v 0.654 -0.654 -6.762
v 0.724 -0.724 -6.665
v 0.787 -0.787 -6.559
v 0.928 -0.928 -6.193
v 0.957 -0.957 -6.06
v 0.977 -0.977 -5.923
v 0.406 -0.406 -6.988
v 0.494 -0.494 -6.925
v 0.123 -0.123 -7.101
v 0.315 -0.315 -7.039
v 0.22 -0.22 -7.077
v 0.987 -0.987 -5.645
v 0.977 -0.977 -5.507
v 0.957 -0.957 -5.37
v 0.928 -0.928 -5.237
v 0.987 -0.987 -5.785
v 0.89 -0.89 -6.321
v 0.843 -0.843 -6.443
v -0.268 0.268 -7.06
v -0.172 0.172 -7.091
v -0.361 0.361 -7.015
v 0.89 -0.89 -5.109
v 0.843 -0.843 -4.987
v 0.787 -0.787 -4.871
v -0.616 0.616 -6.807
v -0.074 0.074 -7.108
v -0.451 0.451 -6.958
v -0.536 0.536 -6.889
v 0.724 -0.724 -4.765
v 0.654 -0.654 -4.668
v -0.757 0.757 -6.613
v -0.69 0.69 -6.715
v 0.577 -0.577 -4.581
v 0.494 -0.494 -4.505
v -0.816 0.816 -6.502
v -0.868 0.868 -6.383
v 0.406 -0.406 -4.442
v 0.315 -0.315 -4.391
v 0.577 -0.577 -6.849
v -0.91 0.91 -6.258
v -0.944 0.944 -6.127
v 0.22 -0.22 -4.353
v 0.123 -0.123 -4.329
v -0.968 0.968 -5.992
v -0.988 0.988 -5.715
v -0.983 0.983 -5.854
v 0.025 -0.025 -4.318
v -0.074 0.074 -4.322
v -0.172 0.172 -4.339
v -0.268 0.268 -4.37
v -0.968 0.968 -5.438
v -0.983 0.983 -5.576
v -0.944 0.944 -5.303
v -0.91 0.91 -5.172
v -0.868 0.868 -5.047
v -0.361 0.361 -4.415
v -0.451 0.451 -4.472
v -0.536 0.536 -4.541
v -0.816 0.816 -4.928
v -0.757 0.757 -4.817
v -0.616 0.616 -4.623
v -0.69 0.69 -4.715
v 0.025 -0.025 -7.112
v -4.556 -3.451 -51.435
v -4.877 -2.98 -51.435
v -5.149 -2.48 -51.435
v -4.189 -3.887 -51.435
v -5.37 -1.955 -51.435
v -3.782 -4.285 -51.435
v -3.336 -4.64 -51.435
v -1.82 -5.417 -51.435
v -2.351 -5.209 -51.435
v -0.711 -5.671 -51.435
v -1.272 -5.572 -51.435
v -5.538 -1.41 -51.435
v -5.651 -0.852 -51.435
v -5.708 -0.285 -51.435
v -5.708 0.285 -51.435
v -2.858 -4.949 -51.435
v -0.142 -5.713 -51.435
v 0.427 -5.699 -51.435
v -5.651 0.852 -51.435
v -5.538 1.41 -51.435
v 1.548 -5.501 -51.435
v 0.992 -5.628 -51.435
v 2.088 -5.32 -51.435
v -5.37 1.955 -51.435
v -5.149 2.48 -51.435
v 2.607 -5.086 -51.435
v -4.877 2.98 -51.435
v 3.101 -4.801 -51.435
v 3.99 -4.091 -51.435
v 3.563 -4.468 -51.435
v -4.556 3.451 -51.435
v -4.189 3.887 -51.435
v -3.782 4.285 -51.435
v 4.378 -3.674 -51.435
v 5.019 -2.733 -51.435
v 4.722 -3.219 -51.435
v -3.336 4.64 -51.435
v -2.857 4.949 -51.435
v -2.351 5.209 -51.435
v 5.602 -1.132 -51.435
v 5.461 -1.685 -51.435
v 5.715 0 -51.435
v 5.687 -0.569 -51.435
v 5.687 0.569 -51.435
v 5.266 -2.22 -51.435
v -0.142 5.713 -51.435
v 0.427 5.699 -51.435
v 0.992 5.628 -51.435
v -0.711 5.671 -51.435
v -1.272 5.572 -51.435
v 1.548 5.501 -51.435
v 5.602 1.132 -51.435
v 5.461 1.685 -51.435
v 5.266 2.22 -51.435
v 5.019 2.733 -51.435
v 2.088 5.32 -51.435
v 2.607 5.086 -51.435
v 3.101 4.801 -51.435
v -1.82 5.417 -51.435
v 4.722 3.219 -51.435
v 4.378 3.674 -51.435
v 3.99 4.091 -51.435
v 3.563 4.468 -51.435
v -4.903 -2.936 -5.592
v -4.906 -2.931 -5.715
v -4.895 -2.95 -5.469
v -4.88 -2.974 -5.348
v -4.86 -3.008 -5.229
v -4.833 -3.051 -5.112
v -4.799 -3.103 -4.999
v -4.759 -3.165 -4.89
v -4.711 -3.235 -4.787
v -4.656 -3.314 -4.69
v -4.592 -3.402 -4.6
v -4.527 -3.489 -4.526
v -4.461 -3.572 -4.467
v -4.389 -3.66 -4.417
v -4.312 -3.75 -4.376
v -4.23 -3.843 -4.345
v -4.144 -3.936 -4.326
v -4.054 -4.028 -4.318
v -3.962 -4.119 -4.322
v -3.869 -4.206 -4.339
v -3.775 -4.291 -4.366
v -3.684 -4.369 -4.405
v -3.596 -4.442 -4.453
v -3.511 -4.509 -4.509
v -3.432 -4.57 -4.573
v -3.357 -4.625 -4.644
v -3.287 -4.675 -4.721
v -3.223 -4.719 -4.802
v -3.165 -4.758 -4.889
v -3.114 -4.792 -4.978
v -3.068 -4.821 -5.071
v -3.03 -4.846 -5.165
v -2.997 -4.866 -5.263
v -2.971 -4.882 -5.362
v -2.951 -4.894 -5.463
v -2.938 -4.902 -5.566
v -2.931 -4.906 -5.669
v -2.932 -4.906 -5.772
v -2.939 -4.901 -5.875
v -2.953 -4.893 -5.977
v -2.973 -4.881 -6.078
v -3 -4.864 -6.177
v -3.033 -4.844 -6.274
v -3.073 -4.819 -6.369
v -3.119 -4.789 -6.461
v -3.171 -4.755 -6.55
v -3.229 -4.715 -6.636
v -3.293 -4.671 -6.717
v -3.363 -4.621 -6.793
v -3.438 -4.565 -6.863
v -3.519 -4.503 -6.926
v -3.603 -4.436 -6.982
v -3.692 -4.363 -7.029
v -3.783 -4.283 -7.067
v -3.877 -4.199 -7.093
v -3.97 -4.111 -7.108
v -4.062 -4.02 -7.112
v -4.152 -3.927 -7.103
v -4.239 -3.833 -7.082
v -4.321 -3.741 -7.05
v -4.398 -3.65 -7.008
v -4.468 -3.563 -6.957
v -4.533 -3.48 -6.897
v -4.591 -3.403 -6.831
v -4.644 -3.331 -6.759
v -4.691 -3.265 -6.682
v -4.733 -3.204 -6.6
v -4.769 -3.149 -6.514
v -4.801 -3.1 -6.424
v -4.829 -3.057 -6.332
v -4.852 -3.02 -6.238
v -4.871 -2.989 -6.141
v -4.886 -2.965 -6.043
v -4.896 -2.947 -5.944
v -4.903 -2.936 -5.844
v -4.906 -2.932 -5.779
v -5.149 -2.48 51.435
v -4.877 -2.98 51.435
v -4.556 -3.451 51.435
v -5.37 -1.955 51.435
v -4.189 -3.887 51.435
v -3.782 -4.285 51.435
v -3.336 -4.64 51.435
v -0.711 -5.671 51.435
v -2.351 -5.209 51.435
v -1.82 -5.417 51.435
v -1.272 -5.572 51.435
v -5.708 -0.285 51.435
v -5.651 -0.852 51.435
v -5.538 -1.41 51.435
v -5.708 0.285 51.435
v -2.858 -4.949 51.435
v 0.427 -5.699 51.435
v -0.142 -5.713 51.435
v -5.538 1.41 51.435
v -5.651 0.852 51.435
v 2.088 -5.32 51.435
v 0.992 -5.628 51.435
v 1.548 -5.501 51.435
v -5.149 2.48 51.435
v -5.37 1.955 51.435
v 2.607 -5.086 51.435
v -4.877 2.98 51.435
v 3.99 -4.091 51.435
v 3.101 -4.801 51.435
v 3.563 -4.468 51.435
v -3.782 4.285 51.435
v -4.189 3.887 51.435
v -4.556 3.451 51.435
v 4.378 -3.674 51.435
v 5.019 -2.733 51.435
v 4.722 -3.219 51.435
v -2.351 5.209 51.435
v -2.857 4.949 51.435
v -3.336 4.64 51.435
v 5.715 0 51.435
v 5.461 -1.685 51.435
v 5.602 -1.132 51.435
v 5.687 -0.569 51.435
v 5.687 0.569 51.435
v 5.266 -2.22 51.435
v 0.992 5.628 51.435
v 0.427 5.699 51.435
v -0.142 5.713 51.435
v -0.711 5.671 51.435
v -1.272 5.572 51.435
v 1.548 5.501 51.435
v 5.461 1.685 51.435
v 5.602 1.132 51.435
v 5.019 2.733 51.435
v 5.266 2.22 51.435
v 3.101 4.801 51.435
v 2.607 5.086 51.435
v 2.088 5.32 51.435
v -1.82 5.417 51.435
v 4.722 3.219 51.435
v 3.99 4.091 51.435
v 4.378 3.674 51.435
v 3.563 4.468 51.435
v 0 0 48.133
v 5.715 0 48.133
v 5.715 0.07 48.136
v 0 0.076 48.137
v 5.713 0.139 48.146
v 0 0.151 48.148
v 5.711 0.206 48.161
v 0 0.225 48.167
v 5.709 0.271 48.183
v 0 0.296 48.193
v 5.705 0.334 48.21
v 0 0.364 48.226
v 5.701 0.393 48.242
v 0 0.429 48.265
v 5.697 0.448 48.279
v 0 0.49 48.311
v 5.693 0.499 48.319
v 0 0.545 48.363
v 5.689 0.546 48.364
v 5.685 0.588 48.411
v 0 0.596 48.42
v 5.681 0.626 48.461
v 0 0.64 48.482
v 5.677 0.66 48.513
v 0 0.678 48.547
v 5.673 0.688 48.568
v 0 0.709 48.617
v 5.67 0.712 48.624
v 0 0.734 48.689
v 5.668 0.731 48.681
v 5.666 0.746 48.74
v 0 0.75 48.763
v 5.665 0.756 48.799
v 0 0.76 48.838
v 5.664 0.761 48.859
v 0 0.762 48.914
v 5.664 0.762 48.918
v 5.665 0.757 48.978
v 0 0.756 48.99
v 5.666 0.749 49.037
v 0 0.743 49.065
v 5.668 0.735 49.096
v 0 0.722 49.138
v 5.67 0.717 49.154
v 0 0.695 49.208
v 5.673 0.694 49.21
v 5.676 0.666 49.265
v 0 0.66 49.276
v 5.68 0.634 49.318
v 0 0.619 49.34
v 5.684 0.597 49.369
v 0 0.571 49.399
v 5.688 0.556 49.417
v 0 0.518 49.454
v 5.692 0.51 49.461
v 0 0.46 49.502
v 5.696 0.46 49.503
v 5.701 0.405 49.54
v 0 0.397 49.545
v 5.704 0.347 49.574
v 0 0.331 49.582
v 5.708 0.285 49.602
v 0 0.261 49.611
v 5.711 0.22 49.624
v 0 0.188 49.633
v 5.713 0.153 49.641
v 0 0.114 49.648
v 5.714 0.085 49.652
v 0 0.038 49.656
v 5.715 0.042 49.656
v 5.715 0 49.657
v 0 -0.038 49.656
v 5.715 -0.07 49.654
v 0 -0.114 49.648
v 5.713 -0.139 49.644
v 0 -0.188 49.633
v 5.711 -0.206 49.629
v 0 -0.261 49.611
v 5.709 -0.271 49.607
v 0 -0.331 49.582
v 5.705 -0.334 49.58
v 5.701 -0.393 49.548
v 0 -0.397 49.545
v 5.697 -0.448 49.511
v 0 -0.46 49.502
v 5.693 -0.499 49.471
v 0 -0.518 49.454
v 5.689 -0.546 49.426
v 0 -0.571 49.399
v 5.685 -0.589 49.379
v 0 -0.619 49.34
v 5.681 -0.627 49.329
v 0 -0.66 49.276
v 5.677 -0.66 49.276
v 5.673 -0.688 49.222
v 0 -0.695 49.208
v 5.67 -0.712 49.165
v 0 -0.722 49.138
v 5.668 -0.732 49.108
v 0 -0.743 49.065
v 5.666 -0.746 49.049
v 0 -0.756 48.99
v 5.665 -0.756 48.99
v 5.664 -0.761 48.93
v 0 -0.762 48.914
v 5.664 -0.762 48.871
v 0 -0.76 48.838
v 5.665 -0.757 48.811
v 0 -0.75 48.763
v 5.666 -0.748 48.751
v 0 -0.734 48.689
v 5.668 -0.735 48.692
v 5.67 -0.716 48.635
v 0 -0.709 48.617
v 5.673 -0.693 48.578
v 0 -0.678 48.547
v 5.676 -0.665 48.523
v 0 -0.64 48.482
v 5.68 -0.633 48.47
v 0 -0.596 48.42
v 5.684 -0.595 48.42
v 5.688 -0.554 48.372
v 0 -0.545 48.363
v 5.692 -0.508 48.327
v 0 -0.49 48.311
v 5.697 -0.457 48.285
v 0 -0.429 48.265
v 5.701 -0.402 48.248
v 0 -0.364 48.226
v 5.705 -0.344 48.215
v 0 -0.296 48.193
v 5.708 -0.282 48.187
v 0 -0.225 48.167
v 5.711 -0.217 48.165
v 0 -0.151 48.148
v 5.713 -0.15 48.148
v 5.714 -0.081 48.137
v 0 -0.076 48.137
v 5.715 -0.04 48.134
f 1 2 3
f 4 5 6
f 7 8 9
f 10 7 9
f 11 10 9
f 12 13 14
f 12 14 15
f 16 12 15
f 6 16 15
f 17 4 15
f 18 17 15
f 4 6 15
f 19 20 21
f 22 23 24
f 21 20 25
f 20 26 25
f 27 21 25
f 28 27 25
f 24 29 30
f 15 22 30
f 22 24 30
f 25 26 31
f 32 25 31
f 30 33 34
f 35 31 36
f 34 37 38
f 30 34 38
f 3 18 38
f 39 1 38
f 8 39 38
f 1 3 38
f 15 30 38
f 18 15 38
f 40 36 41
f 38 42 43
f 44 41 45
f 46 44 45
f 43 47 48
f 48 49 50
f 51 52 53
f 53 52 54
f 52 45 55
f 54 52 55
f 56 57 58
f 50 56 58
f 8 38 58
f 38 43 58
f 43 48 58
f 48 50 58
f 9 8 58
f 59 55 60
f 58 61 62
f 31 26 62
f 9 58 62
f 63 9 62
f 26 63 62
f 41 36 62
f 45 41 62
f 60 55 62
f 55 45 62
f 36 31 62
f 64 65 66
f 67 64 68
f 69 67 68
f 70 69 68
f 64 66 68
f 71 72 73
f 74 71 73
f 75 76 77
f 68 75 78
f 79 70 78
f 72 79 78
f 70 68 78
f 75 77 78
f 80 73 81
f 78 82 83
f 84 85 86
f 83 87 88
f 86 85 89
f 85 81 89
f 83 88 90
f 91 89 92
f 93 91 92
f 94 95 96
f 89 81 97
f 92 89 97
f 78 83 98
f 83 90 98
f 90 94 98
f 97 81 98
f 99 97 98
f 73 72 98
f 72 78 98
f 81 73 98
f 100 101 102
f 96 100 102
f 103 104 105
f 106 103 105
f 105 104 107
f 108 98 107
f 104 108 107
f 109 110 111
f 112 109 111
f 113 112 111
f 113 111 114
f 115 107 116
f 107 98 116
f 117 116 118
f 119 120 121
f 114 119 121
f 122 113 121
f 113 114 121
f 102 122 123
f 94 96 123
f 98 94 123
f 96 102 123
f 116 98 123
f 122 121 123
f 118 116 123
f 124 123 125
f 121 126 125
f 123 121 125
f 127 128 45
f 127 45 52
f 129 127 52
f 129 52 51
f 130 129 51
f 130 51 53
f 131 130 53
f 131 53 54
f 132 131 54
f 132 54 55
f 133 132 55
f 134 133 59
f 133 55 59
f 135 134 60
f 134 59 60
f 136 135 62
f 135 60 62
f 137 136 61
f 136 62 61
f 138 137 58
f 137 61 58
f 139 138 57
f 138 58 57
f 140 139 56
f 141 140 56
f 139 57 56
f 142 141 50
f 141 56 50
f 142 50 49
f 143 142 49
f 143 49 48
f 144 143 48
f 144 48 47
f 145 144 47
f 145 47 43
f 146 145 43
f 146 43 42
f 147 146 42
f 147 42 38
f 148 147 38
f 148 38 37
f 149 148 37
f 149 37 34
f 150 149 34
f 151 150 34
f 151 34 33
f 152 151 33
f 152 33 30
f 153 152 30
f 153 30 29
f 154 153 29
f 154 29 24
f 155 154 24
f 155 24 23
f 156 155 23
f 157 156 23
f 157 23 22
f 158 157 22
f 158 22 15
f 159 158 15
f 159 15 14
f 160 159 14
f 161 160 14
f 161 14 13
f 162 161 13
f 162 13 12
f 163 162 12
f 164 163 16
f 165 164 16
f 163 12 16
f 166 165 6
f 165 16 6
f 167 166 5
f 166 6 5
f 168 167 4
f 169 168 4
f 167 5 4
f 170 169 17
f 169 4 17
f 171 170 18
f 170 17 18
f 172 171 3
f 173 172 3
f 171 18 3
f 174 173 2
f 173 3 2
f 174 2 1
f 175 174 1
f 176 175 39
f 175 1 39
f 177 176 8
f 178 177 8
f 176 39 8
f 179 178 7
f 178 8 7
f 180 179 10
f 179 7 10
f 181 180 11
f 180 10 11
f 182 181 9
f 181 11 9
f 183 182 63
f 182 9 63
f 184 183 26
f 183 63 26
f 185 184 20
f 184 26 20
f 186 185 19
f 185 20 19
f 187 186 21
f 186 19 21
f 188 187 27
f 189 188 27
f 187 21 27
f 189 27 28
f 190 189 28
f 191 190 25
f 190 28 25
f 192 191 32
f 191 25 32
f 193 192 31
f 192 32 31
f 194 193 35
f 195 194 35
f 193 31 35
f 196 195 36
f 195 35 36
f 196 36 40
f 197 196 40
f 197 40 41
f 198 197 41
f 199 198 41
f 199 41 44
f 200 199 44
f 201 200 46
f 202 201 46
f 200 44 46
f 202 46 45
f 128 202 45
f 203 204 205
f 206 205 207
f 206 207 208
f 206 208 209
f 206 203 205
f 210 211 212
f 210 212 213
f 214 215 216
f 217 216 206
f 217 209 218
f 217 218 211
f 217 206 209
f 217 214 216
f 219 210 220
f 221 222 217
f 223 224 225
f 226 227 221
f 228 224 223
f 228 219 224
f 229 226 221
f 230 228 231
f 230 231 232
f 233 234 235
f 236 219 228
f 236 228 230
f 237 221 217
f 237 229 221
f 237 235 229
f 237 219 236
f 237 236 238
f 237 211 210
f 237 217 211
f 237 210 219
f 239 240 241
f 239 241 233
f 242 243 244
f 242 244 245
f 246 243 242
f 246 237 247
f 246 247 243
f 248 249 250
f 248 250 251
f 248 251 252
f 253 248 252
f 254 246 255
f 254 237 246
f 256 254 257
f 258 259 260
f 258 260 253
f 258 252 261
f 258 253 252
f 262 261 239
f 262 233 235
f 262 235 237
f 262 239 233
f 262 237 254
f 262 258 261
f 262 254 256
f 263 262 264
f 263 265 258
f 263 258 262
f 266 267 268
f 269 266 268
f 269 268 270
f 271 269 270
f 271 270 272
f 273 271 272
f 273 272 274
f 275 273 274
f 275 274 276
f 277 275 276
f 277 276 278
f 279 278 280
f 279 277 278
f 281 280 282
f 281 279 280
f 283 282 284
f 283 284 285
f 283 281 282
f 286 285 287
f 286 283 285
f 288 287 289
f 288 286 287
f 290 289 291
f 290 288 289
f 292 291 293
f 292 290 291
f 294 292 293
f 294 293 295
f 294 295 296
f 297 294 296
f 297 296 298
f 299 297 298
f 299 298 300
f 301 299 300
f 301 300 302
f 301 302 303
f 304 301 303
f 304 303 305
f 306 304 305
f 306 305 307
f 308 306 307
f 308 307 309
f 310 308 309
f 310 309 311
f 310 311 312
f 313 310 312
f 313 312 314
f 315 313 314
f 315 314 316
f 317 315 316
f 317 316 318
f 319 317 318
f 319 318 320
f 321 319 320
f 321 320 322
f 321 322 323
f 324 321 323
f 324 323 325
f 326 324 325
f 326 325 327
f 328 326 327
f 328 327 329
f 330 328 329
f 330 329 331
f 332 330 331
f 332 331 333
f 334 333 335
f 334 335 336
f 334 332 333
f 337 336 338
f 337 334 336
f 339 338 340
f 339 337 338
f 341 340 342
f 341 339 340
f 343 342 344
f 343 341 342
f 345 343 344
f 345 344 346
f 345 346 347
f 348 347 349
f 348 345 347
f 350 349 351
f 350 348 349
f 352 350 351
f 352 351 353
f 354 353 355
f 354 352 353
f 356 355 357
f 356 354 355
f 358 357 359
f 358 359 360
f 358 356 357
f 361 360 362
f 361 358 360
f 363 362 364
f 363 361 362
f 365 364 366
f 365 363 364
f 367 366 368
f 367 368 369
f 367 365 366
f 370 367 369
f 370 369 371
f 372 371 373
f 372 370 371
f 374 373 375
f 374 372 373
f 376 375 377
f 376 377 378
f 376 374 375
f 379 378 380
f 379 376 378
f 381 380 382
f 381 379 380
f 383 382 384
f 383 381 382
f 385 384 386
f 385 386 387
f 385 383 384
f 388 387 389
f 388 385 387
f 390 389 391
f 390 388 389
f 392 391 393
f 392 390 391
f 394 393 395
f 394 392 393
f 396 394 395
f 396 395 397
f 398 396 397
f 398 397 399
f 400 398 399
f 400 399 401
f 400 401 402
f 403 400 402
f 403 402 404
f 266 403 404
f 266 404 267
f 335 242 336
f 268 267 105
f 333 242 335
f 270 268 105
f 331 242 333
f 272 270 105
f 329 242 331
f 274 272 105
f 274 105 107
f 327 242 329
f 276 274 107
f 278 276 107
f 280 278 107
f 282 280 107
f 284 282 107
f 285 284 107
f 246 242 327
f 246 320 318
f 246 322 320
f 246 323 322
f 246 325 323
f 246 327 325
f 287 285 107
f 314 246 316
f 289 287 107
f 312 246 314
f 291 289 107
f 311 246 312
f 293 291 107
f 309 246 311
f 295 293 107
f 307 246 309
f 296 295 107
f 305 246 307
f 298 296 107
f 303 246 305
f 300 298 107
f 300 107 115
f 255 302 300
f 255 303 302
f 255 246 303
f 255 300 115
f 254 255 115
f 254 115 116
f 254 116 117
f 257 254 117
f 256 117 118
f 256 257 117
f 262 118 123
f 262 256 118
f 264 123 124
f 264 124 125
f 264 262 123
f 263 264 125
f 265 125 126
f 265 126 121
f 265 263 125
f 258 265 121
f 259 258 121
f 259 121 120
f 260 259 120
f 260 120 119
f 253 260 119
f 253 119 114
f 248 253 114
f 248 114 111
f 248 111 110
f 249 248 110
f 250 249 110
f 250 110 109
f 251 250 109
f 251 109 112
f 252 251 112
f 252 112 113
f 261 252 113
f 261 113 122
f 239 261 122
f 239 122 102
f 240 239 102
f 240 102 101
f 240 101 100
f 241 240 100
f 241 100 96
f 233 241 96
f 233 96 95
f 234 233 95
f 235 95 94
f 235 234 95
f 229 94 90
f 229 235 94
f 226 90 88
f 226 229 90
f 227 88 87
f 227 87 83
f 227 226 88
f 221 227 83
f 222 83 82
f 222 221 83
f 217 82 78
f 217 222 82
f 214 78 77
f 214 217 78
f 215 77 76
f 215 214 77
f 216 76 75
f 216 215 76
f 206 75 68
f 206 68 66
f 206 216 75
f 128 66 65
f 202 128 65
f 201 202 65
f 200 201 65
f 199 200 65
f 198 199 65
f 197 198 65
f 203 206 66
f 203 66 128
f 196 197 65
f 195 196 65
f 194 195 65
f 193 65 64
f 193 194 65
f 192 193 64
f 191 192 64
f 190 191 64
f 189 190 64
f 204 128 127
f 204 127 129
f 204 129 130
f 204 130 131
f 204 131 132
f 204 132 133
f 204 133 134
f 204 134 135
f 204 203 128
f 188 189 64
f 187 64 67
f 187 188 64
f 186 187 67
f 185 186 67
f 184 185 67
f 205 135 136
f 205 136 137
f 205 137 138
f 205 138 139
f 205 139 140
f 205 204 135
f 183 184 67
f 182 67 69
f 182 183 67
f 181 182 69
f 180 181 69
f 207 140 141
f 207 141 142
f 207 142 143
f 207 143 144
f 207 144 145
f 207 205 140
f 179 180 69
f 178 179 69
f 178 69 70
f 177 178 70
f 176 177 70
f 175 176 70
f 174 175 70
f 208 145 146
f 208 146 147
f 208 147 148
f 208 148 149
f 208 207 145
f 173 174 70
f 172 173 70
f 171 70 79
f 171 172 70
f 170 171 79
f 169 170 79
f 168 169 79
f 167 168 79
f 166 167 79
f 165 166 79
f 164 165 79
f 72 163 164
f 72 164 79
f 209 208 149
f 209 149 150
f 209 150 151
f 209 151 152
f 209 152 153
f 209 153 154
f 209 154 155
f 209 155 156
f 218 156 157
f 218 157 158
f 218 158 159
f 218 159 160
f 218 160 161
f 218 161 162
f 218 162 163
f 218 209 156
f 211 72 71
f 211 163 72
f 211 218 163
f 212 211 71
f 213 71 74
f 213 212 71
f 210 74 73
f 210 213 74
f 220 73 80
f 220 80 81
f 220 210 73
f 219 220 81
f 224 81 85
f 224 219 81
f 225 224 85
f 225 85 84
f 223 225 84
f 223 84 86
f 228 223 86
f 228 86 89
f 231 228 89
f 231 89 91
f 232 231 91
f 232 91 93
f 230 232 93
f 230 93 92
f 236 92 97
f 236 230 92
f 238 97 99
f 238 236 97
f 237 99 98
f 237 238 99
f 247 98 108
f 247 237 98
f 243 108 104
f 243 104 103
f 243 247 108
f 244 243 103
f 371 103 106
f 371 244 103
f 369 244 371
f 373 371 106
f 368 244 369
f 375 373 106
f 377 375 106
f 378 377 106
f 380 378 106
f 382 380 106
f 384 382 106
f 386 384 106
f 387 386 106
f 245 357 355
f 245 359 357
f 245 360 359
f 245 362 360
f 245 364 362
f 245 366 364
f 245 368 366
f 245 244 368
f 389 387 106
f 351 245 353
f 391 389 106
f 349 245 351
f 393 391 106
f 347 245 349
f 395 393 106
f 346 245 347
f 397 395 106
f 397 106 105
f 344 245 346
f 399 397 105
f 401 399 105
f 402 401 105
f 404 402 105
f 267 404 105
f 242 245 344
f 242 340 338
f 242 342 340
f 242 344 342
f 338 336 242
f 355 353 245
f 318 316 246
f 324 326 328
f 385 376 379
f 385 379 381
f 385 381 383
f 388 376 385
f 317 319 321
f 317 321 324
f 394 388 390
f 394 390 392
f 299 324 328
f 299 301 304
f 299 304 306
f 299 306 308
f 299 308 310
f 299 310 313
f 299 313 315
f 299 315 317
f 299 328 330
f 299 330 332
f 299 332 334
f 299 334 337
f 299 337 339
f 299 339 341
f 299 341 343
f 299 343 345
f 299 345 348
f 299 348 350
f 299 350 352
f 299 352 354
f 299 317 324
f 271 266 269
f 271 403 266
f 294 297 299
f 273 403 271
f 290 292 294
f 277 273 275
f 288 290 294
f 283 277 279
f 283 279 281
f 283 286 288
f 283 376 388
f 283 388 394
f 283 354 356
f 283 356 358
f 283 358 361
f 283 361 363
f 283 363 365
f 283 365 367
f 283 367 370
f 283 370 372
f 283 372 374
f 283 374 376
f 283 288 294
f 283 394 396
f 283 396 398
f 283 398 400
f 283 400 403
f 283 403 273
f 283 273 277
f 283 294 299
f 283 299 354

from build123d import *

# Parameters (mm, degrees)
SKETCH1_R           = 3.81
BOSS_EXTRUDE1_DEPTH = 34.29
SCALE1_SCALE        = 1.5
SKETCH2_R           = 0.762
CUT_EXTRUDE1_DEPTH  = 53.066127905
SKETCH3_R           = 1.397
CUT_EXTRUDE2_DEPTH  = 53.066128026


with BuildPart() as part:
    # Sketch1 → Boss-Extrude1 (new, symmetric)
    with BuildSketch(Plane.XY):
        Circle(SKETCH1_R)
    extrude(amount=BOSS_EXTRUDE1_DEPTH, both=True)


with BuildPart() as part_1:
    # Scale1: scaled about (0, 0, 0)
    add(part.part.scale(SCALE1_SCALE))

    # Sketch2 → Cut-Extrude1 (cut, through all)
    with BuildSketch(Plane(origin=(0, 0, 0), x_dir=(0, 0, -1), z_dir=(1, 0, 0))):
        with Locations((-48.895, 0)):
            Circle(SKETCH2_R)
    extrude(amount=CUT_EXTRUDE1_DEPTH, mode=Mode.SUBTRACT)

    # Sketch3 → Cut-Extrude2 (cut, through all)
    with BuildSketch(Plane(origin=(0, 0, 0), x_dir=(-0.7071067811865476, 0.7071067811865476, 0), z_dir=(0.7071067811865476, 0.7071067811865476, 0))):
        with Locations((0, -5.715)):
            Circle(SKETCH3_R)
    extrude(amount=-CUT_EXTRUDE2_DEPTH, mode=Mode.SUBTRACT)


solid = part_1.part
